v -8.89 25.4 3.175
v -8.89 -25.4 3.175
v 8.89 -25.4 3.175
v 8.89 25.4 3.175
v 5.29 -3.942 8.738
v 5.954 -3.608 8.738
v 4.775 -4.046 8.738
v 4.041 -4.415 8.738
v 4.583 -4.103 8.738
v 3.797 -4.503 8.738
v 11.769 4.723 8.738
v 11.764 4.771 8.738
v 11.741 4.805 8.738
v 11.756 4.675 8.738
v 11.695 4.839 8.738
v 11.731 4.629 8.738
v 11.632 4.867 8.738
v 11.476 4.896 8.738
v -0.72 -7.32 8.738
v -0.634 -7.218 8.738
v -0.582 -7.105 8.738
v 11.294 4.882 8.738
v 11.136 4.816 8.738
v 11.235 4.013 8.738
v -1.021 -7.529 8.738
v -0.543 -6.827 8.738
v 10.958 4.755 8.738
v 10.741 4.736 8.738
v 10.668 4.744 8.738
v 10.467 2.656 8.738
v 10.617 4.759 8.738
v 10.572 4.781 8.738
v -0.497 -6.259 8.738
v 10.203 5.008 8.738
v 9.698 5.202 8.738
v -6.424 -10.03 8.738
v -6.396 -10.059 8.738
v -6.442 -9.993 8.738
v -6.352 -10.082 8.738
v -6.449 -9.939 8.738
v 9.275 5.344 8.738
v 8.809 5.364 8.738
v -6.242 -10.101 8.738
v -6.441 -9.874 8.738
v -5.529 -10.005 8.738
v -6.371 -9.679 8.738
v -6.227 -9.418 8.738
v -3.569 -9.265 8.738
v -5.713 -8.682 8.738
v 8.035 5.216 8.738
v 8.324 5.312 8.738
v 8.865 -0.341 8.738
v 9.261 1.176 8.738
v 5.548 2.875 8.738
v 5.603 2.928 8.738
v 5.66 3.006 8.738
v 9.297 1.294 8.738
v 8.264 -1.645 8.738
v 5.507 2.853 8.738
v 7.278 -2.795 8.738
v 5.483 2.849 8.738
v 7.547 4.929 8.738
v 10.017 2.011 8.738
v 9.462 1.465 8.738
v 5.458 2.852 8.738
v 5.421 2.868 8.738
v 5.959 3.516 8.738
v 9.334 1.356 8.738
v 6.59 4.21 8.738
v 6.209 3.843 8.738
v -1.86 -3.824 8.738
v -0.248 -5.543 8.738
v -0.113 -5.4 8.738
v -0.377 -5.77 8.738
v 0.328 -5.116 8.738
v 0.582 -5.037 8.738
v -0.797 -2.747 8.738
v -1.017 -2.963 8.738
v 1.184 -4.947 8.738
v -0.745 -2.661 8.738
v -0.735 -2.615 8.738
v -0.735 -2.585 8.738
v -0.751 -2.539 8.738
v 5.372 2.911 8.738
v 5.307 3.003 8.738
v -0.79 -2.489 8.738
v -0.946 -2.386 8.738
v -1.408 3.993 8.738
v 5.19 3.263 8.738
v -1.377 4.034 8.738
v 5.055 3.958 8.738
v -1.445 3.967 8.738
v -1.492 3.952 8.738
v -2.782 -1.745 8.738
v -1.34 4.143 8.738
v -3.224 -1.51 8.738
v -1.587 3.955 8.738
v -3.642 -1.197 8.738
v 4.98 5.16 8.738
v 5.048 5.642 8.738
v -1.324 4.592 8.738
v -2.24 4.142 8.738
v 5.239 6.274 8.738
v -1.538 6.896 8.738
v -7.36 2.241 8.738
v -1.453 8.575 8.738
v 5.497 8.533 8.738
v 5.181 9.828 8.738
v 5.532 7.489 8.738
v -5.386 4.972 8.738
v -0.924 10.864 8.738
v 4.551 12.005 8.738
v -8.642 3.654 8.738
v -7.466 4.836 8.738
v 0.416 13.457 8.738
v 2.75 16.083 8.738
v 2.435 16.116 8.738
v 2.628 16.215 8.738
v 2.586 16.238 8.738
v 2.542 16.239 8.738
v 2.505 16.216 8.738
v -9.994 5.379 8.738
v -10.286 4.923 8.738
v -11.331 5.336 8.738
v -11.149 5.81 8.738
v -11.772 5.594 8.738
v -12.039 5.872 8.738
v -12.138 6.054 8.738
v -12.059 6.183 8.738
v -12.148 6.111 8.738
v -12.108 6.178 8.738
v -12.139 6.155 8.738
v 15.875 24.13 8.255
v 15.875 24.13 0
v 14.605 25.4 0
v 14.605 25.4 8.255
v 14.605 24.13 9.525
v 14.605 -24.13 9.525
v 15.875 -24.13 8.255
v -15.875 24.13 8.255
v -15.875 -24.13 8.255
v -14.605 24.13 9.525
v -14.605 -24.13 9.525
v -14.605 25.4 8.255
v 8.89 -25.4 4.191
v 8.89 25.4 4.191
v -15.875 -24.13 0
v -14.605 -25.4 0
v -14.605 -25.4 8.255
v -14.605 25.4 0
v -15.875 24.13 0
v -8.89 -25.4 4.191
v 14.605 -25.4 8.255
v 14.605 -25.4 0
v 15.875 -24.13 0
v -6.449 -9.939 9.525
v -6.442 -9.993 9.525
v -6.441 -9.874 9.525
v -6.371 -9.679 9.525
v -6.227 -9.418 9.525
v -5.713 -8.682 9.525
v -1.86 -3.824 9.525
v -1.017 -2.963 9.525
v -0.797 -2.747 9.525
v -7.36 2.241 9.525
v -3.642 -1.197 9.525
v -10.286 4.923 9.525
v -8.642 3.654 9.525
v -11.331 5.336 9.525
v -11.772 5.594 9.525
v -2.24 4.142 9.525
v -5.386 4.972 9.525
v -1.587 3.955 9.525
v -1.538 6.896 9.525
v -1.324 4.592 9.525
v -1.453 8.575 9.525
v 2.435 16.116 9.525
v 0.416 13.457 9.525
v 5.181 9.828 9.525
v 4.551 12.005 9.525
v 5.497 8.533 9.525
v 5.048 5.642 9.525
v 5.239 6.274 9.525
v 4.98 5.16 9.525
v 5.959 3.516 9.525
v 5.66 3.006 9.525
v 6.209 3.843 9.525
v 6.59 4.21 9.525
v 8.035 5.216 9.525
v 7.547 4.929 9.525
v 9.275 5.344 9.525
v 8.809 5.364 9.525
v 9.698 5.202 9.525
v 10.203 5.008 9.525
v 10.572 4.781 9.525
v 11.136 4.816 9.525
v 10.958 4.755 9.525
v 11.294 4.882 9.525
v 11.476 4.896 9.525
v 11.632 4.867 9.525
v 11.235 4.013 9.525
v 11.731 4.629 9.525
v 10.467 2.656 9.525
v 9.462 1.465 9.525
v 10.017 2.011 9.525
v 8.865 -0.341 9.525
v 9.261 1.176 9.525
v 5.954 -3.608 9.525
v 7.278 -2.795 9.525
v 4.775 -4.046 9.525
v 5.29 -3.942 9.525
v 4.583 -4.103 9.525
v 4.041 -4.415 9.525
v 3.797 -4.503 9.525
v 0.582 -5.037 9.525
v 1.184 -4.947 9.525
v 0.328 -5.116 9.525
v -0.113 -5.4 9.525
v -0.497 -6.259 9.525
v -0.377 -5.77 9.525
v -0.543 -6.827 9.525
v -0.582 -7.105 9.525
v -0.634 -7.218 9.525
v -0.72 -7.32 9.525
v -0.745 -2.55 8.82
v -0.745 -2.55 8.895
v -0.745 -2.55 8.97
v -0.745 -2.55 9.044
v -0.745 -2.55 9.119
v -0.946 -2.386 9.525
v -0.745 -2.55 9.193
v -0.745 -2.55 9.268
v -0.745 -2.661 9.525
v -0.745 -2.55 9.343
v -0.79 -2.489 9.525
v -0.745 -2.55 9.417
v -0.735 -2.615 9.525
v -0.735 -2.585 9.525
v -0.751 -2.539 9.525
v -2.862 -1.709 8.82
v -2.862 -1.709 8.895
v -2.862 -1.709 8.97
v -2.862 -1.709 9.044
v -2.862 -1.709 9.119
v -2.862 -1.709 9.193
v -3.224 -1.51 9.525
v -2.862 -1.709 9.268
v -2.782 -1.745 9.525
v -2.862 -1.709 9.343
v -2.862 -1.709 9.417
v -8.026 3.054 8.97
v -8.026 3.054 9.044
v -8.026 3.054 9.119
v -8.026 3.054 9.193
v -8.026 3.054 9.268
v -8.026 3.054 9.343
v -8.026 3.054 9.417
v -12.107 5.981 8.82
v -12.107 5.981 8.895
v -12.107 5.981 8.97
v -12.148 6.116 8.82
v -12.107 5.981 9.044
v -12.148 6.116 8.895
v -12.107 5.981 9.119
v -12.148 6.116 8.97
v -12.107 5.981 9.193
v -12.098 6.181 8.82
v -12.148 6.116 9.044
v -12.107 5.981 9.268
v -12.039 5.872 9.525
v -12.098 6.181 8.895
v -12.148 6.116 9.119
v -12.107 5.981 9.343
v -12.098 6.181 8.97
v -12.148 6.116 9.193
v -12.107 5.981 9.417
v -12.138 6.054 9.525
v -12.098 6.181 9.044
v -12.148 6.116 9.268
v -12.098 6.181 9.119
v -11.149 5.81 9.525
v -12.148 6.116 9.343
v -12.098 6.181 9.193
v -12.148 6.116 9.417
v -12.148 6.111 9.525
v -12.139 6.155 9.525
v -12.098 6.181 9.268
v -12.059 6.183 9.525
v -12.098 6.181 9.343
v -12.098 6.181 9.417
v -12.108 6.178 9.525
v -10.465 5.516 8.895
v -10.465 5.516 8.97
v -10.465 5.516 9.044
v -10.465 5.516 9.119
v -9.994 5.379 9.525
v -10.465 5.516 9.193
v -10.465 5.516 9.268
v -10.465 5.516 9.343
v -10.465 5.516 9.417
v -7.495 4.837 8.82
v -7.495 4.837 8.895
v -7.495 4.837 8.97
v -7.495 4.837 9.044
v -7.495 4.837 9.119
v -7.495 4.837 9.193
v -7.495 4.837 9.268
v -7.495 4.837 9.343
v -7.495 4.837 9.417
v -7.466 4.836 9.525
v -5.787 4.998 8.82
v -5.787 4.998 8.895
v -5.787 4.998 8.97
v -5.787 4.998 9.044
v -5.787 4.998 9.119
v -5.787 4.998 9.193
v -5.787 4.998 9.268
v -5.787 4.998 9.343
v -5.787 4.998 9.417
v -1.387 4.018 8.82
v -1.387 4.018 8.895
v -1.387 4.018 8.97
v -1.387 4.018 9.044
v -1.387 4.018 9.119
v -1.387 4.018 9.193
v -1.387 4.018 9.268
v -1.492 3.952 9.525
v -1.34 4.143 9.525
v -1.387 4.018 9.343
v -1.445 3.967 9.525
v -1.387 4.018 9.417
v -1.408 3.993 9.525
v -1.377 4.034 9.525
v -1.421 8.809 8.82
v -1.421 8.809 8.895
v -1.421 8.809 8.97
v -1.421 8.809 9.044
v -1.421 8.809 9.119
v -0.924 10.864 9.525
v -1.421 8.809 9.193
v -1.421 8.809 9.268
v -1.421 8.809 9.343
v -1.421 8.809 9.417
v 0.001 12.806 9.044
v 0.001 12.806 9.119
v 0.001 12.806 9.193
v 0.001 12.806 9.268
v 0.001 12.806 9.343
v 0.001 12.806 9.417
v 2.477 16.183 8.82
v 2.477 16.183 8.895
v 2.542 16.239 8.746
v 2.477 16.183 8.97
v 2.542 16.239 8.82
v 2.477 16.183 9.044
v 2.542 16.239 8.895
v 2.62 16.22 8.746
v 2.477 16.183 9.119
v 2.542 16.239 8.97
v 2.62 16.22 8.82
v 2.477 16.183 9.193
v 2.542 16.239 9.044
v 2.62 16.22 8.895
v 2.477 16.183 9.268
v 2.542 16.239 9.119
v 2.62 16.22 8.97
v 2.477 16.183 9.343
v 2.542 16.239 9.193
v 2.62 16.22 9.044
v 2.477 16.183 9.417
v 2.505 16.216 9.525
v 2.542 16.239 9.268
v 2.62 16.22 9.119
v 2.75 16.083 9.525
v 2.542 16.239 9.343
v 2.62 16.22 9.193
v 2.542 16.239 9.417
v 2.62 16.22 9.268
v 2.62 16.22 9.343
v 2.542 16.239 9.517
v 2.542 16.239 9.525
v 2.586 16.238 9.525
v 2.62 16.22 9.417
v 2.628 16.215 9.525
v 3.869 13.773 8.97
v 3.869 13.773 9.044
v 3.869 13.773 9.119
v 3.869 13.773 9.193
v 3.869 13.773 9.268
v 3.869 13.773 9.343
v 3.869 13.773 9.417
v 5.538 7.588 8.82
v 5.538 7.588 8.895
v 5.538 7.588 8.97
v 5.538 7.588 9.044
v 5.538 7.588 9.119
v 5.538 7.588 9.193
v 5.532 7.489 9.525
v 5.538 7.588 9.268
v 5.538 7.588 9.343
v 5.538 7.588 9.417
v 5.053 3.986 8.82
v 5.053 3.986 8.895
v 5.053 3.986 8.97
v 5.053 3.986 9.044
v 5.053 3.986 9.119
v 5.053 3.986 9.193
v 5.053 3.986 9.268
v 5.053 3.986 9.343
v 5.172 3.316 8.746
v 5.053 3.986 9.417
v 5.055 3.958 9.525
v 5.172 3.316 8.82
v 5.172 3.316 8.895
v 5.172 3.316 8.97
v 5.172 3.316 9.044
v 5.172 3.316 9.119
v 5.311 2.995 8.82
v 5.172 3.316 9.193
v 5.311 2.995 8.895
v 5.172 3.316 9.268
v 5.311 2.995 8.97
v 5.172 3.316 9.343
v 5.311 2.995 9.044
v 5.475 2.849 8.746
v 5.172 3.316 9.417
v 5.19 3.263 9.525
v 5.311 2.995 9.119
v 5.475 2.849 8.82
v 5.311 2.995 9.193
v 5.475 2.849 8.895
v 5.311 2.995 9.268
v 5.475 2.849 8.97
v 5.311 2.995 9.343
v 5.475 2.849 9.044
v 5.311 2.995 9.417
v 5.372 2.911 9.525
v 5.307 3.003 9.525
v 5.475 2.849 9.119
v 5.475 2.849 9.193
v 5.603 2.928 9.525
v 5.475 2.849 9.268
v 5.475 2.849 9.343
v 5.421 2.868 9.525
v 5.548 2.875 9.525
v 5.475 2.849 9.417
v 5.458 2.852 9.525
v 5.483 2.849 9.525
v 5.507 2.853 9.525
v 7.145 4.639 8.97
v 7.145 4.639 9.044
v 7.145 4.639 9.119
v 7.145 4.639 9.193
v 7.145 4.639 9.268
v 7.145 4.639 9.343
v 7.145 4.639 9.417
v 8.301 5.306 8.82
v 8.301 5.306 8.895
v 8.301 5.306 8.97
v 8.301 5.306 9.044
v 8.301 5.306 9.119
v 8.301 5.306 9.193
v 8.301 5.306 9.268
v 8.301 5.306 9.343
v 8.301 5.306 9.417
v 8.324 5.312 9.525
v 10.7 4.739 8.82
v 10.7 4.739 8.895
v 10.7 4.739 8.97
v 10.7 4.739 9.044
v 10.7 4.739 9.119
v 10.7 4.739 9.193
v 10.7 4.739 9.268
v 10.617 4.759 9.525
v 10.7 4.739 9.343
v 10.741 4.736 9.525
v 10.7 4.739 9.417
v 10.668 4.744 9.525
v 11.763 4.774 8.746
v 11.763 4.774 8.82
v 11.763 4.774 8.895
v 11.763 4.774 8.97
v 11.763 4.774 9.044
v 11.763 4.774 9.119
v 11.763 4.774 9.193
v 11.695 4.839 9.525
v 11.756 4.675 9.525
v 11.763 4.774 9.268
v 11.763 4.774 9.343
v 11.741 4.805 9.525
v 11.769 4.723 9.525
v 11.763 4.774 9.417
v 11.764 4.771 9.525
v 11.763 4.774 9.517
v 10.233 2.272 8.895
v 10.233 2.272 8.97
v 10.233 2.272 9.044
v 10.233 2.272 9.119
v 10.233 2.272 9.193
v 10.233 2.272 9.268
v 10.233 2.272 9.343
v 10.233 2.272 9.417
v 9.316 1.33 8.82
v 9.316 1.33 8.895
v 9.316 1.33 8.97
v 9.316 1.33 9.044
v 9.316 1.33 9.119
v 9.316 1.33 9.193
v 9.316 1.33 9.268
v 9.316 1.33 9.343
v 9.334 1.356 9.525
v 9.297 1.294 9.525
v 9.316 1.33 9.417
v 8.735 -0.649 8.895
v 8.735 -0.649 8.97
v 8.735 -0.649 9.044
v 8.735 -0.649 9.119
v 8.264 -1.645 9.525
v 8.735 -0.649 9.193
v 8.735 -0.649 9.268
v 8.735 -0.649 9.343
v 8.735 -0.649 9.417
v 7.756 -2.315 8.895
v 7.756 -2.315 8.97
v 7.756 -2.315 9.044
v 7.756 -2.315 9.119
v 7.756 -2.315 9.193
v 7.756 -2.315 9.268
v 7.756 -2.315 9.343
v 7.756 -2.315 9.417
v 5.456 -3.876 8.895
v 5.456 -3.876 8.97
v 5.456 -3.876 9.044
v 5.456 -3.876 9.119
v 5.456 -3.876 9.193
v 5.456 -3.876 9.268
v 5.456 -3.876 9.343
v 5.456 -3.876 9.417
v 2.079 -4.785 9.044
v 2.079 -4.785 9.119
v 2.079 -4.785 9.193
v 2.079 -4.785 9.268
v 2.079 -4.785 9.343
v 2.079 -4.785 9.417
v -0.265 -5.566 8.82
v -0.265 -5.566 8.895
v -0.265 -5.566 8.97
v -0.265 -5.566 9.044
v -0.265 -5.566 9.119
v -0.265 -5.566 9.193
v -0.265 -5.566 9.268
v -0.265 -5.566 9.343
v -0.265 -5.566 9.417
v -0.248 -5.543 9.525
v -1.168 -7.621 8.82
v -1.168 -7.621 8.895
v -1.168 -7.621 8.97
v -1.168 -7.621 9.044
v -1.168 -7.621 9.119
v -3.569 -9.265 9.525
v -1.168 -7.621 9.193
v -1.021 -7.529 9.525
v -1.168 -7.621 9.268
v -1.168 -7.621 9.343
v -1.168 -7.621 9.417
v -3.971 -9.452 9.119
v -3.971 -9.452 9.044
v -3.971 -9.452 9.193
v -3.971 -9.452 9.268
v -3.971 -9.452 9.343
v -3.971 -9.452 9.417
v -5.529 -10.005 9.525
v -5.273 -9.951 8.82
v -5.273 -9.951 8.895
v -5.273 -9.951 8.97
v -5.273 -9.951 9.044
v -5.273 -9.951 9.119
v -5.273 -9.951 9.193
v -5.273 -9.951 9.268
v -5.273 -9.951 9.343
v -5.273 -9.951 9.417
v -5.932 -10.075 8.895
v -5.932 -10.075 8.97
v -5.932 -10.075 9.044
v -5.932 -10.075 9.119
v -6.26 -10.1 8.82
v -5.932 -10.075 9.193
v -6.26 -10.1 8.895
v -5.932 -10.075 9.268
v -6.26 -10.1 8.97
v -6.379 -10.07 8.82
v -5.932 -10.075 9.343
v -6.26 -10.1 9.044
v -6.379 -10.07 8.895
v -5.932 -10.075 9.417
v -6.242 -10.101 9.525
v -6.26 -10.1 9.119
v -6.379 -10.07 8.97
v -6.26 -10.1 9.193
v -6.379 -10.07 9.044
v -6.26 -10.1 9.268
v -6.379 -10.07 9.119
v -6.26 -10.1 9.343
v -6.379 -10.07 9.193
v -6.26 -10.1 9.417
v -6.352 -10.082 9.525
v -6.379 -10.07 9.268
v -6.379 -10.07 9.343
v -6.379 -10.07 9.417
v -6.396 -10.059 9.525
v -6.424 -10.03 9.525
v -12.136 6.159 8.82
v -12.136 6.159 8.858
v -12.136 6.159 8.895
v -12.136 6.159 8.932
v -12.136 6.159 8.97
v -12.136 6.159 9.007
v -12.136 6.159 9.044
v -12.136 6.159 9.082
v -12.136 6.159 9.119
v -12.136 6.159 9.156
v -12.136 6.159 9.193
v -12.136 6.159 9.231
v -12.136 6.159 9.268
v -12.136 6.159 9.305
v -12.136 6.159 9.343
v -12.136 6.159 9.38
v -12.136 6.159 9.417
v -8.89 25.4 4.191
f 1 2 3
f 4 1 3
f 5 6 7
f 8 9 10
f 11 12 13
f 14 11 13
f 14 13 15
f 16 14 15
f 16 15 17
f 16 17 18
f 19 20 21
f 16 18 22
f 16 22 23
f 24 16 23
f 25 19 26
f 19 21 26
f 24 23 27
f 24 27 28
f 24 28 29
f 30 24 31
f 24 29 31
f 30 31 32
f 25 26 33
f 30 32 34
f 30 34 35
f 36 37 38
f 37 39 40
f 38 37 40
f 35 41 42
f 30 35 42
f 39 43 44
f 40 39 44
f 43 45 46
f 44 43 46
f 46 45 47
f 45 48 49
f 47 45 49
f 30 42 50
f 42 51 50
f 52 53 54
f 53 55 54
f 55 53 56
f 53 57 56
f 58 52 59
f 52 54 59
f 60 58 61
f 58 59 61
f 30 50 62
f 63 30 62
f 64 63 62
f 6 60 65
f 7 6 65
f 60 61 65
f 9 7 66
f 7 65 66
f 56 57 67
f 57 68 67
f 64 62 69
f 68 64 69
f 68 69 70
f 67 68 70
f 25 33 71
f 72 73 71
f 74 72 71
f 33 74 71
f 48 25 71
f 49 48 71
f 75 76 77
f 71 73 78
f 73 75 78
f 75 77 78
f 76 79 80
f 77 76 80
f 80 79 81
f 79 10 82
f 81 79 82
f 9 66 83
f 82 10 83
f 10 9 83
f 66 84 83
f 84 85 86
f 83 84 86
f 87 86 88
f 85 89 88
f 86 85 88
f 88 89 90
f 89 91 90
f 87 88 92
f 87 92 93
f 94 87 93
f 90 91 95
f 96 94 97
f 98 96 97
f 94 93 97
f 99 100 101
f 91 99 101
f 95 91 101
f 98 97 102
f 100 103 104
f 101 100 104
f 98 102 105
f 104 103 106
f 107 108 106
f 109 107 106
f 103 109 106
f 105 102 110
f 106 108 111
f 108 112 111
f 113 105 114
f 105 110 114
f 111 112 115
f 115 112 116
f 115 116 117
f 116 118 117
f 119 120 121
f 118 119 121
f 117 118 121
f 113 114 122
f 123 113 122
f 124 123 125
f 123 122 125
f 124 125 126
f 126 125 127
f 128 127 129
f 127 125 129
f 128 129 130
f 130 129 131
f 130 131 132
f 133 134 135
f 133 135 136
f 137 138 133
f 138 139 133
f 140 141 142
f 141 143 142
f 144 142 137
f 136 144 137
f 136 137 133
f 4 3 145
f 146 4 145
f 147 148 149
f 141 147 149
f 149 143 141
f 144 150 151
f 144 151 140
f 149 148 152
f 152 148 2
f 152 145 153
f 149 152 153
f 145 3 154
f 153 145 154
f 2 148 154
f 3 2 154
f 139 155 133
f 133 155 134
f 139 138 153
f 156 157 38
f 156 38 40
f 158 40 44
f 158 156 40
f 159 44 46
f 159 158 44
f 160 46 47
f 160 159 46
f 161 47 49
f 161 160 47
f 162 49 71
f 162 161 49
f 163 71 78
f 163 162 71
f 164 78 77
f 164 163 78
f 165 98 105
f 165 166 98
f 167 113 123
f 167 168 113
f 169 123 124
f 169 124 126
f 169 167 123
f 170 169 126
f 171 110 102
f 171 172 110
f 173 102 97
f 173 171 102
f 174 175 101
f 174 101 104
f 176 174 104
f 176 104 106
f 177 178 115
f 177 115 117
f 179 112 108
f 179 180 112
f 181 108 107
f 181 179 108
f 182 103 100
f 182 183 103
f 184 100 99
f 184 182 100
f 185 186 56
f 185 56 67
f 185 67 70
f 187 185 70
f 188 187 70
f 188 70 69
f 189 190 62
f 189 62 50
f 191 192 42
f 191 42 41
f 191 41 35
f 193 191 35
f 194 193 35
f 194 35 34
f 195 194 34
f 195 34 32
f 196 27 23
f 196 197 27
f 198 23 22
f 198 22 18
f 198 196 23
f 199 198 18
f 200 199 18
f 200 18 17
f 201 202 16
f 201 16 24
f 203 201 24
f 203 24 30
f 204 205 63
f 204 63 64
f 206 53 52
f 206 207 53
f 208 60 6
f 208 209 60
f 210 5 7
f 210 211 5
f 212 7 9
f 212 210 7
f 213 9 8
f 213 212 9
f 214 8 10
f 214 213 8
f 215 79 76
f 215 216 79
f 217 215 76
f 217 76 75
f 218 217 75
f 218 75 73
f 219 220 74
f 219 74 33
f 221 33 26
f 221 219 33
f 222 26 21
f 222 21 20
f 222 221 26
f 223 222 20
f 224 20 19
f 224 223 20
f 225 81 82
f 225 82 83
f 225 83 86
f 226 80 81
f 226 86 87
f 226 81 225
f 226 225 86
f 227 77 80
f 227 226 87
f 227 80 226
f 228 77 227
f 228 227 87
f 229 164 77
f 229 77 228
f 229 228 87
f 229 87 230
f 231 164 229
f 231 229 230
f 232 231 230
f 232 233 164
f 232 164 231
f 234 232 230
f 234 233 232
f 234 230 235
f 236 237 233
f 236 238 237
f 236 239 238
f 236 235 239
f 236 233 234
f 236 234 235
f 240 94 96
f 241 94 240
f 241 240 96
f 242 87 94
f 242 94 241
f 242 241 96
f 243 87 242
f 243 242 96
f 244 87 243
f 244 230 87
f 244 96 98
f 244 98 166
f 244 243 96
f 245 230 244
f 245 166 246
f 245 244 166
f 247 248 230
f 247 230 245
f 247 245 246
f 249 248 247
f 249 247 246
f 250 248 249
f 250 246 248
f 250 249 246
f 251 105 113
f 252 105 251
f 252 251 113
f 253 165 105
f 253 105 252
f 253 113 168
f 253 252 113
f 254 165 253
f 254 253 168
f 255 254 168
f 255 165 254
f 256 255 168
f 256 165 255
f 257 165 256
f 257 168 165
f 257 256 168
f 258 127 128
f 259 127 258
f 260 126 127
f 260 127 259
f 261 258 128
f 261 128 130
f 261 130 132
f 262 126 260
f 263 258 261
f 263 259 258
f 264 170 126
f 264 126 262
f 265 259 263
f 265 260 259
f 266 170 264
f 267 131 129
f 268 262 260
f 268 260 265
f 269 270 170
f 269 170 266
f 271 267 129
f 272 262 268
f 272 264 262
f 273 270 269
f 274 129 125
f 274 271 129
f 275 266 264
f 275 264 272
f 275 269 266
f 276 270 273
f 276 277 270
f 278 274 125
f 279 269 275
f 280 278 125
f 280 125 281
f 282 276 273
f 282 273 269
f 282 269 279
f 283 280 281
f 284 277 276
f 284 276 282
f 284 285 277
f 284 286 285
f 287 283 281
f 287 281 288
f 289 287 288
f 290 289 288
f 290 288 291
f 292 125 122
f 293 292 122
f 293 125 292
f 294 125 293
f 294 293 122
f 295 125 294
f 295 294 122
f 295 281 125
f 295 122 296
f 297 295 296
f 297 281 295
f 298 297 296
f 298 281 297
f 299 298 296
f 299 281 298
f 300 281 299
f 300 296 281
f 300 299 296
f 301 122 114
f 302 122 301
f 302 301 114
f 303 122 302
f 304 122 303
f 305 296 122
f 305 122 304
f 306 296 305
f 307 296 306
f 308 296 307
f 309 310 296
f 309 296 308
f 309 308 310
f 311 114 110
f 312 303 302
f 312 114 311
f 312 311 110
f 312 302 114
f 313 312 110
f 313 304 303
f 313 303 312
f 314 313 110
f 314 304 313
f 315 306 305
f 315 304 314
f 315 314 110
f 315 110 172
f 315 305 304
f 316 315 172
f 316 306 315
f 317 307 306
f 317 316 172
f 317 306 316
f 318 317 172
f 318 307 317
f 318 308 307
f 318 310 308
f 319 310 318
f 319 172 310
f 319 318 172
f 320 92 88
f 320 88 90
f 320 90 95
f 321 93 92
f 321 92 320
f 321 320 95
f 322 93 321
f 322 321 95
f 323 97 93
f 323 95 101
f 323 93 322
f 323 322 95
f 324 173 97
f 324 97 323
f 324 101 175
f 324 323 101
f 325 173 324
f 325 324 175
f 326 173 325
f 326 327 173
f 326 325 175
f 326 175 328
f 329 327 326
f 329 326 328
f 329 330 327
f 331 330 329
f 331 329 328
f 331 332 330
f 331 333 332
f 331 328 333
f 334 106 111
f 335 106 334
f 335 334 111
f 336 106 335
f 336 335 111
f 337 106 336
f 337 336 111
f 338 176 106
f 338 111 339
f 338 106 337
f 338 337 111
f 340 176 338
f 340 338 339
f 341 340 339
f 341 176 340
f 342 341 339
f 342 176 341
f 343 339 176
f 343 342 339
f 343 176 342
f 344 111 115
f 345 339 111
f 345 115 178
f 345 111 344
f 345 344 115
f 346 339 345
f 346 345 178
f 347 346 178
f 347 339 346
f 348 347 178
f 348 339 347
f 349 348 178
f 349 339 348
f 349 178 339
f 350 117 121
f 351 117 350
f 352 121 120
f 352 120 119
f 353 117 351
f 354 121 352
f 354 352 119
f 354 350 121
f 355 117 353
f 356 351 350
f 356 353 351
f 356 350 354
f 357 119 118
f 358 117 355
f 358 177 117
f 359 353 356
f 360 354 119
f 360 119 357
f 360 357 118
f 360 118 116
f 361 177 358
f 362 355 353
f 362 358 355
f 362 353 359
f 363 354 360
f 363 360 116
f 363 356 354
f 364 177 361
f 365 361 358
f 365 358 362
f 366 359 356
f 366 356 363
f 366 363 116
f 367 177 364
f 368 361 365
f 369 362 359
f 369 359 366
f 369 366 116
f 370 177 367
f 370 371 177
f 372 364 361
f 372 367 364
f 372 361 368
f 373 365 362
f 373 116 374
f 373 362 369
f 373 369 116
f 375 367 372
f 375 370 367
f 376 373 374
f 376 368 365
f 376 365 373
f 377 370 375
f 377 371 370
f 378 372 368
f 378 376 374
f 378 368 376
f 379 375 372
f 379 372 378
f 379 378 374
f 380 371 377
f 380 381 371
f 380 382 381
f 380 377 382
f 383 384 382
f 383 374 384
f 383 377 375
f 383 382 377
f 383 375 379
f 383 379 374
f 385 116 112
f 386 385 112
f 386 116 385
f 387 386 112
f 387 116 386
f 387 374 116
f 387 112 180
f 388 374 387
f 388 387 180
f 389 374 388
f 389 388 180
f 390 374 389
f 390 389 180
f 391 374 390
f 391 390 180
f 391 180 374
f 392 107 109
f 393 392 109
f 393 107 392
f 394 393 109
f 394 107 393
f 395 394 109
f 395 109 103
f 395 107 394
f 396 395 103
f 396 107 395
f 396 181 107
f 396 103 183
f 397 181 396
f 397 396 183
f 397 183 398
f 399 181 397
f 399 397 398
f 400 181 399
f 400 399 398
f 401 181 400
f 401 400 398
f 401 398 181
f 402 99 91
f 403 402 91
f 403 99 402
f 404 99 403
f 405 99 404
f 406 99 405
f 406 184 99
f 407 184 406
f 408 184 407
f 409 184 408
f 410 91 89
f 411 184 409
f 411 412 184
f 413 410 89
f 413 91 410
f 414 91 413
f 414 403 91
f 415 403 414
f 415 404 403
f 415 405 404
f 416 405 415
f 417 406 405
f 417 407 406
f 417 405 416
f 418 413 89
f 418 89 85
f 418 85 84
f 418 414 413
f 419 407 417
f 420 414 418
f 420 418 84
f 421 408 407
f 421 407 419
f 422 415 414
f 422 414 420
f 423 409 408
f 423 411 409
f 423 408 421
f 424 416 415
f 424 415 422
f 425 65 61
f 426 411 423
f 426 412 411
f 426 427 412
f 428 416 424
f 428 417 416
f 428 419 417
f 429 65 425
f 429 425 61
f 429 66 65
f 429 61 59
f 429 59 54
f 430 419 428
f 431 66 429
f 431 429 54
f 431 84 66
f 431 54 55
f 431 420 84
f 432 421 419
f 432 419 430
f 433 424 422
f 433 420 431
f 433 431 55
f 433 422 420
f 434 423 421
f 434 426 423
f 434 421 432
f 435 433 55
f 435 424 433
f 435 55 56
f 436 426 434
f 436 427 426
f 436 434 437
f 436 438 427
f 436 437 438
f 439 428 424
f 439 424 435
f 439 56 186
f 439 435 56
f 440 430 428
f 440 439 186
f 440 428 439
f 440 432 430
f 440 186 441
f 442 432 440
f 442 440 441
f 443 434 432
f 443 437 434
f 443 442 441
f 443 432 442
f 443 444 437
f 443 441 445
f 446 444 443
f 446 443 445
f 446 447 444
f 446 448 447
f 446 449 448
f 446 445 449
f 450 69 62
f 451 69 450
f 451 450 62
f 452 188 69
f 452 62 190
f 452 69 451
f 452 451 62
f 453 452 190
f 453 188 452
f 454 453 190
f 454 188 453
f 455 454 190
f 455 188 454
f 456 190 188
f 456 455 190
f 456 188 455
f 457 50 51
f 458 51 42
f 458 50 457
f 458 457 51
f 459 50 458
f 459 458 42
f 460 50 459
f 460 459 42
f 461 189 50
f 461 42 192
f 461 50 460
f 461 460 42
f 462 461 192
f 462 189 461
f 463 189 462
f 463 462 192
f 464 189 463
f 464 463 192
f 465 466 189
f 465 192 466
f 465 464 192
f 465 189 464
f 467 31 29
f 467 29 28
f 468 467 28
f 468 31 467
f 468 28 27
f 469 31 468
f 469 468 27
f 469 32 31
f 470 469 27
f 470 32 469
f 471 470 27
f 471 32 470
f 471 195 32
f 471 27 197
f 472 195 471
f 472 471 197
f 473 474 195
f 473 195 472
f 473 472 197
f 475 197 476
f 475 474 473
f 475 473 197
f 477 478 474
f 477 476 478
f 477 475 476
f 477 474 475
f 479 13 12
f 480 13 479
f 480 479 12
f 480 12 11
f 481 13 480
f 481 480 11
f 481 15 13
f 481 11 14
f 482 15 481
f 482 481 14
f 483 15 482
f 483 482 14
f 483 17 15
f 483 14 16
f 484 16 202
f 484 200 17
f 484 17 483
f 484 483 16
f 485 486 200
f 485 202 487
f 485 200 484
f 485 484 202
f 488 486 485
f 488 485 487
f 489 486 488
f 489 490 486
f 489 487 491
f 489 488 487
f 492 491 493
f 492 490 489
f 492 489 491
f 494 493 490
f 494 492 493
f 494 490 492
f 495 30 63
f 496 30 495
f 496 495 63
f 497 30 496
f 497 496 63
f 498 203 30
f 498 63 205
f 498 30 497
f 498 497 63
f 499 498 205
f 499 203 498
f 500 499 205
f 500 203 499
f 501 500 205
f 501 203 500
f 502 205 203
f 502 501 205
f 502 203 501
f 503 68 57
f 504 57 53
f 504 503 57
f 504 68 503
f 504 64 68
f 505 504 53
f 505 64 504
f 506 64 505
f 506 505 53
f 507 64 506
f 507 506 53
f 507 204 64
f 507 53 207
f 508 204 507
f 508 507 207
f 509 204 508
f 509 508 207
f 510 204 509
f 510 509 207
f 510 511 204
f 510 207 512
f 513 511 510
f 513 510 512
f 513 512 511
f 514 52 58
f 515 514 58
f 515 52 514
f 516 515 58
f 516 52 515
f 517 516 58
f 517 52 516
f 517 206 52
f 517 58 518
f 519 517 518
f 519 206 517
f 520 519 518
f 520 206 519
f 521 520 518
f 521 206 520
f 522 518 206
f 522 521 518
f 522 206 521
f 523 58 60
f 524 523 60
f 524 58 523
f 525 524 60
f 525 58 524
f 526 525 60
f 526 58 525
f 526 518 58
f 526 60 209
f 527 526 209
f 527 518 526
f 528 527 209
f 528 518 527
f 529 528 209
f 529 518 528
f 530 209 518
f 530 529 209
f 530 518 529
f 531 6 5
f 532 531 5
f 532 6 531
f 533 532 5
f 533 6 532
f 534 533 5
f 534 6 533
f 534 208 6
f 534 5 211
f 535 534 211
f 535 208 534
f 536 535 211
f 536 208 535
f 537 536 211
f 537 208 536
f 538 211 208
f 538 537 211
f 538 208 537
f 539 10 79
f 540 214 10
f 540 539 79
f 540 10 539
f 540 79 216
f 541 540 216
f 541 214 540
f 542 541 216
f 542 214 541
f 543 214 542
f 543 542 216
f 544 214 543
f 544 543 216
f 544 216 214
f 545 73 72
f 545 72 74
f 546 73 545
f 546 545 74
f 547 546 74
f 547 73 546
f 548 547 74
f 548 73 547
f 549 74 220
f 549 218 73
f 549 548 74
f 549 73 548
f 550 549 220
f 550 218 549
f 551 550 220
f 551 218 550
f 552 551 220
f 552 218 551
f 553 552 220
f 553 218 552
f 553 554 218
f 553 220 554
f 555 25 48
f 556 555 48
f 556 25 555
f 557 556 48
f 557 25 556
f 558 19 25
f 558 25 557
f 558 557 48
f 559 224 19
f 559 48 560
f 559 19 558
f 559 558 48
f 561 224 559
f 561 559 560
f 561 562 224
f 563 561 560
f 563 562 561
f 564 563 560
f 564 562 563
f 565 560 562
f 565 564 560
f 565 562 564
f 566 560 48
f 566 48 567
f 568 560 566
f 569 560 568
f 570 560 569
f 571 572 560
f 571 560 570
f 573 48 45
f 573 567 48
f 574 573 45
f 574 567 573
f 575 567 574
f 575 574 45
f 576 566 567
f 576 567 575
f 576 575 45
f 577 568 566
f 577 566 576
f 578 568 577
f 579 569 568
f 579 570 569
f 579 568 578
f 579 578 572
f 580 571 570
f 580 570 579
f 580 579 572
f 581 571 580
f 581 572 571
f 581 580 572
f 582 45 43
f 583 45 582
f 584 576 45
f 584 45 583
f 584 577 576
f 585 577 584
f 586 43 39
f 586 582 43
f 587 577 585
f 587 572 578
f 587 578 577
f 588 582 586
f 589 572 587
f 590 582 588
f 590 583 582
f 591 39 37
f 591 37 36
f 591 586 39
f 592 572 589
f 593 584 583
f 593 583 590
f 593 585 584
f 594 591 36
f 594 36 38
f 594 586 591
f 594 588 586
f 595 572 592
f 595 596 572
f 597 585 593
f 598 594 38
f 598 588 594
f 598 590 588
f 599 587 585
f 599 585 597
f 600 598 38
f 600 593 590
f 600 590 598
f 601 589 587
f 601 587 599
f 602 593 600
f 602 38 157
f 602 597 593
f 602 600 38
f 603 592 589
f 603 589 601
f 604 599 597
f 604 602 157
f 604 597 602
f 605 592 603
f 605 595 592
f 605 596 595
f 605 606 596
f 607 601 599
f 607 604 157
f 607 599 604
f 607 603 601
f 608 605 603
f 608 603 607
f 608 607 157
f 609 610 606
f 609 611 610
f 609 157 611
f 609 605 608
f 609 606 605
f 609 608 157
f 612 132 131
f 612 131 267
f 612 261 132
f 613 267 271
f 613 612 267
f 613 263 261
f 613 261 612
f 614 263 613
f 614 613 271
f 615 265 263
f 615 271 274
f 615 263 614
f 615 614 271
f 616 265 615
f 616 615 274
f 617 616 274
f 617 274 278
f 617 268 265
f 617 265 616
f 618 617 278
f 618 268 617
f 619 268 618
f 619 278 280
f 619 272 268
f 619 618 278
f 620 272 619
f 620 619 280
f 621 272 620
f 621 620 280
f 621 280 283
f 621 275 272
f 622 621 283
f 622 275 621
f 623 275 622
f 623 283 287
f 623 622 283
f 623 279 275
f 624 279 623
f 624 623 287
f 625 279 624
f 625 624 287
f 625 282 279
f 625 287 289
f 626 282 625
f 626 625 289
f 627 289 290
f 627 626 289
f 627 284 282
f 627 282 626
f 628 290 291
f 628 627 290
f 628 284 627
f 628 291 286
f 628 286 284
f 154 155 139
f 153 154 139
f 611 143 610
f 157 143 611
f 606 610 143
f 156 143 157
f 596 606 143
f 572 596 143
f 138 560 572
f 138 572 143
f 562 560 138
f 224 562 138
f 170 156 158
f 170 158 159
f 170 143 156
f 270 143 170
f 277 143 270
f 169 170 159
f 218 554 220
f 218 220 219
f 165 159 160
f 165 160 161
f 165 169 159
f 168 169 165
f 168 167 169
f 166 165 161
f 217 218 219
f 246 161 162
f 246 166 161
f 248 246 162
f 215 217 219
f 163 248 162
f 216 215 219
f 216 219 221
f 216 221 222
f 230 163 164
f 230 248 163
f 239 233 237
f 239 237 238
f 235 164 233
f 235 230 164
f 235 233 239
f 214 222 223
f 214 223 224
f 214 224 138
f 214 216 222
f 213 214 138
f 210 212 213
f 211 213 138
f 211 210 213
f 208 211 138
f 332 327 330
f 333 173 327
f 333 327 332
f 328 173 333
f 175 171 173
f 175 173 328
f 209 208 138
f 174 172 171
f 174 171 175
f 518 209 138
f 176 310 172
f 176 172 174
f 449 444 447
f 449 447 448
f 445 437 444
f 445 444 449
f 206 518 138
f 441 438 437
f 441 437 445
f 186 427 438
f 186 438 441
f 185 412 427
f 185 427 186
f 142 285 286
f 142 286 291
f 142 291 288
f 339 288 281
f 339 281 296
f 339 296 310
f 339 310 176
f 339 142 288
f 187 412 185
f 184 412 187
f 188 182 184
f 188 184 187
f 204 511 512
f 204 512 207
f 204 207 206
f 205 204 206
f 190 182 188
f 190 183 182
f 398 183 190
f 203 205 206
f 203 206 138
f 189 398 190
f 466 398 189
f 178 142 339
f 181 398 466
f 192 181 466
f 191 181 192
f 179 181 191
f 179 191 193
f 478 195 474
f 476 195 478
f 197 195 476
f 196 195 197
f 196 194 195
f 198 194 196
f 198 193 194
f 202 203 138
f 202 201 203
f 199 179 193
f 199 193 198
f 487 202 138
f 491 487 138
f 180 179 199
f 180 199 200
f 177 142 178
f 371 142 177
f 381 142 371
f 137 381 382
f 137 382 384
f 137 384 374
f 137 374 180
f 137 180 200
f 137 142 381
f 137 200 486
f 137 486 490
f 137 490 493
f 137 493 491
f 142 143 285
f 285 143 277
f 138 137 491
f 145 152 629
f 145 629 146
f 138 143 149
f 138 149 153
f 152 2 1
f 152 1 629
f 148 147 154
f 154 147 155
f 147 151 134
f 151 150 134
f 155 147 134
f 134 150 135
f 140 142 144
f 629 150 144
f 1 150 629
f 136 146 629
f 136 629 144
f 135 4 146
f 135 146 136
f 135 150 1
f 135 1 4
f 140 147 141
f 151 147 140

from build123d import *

# Parameters (mm, degrees)
F0_W     = 31.75
F0_H     = 50.8
F1_DEPTH = 9.525
F2_W     = 17.78
F2_H     = 1.016
F3_DEPTH = 58.42
F4_SIZE  = 1.27
F7_DEPTH = 0.7874


with BuildPart() as f1:
    # F0 (on Top) → F1 (new body)
    with BuildSketch(Plane.XY):
        Rectangle(F0_W, F0_H)
    extrude(amount=F1_DEPTH)

    # F2 (on face) → F3 (cut)
    with BuildSketch(Plane.XZ.offset(25.4)):
        with Locations((0, 3.683)):
            Rectangle(F2_W, F2_H)
    extrude(amount=-F3_DEPTH, mode=Mode.SUBTRACT)

    # F4
    f4_edges = [f1.edges().sort_by_distance(p)[0] for p in [
        (-15.875, 0, 9.525),
        (15.875, 0, 9.525),
        (0, -25.4, 9.525),
        (0, 25.4, 9.525),
        (-15.875, -25.4, 4.7625),
        (-15.875, 25.4, 4.7625),
        (15.875, 25.4, 4.7625),
        (15.875, -25.4, 4.7625),
    ]]
    chamfer(f4_edges, length=F4_SIZE)

    # F6 (on face) → F7 (cut)
    with BuildSketch(Plane.XY.offset(9.525)):
        with BuildLine():
            add(Edge.make_bspline(
                [(-6.4422910614, -9.992572479), (-6.576387638, -9.5277504866), (-2.9682513045, -5.5271485494), (-1.6230370241, -3.3267226029), (-0.1391517651, -2.3837543589), (-3.2745475931, -1.8910386002), (-4.4465516447, -0.1797364285), (-6.7888228815, 1.3070519976), (-7.888095117, 3.0827671512), (-9.4719419101, 4.3360710627), (-10.3052427191, 5.0482783915), (-11.7938524336, 5.3782417952), (-12.4842332356, 6.5829203), (-10.32925606, 5.2604715213), (-8.8451225007, 5.3133712001), (-7.5041527627, 4.6355935651), (-5.7727147566, 5.1814768448), (-4.0784426049, 4.6283461923), (-1.9873135315, 4.0916530706), (-1.108705884, 3.7615835829), (-1.6486852677, 6.5590375218), (-1.4710237672, 8.7687761974), (-1.0661623991, 10.7075732038), (-0.0610322166, 12.855636179), (1.2394716743, 14.6101225048), (2.3332163777, 15.7965761736), (2.5641123266, 16.4961779341), (3.252212115, 15.2178296727), (3.8540014355, 13.7730672833), (4.5585807656, 12.2961361883), (4.8257092414, 10.5291786991), (5.4097550677, 9.4613192433), (5.6340869151, 7.5627733225), (5.3266594346, 6.4884408338), (4.8950565869, 5.3286938068), (5.0601967769, 4.3396482601), (5.041123295, 3.5576924459), (5.4972037108, 2.4843281805), (5.9602740046, 3.7655404276), (7.1142399283, 4.6168015862), (8.0528024254, 5.3075552814), (8.7220878624, 5.3658636167), (9.3004070886, 5.380882436), (9.765063634, 5.1626351357), (10.2212334129, 5.0276867702), (10.521522363, 4.8066763864), (10.6884480245, 4.7128941565), (11.0688814513, 4.7603953024), (11.2323128826, 4.8813015119), (11.4523118748, 4.9065218961), (11.6408865133, 4.8752991874), (11.7926899892, 4.7857749875), (11.750485731, 4.6303349314), (11.6017892672, 4.4808231583), (11.4819118772, 4.3517434996), (11.3218017, 4.1565276582), (11.0066595601, 3.657677632), (10.8380601263, 3.3525955918), (10.6583433698, 2.933851586), (10.4502325895, 2.6481420558), (10.2539582326, 2.2588087396), (9.8756355327, 1.8550879004), (9.6252045102, 1.6491392204), (9.4701910215, 1.4534911373), (9.2726879661, 1.3463737098), (9.2265213781, 0.9109138219), (9.0874966435, 0.3398509189), (8.9620205457, -0.1310281139), (8.7310528775, -0.6459707167), (8.5089153347, -1.2188165983), (8.2716856279, -1.660544323), (7.7650531821, -2.3433500022), (7.058572815, -3.0316958873), (6.2786373328, -3.3954442295), (5.4932410272, -3.9034684174), (4.9521468897, -4.0406062951), (4.5835422446, -4.0413084885), (3.9631062689, -4.5319073147), (3.4102105666, -4.5287631488), (2.7699499357, -4.6692566402), (2.0767651322, -4.7850268217), (1.4604520985, -4.8904421235), (0.8279800508, -5.0195910317), (0.4250010726, -5.0308740722), (-0.1703625544, -5.390322009), (-0.4112720451, -5.780687892), (-0.5018080947, -6.2536290481), (-0.5456870856, -6.6366625746), (-0.5362555398, -6.9175416952), (-0.6106373398, -7.3195509206), (-1.2240352375, -7.6132252976), (-1.8316007812, -8.1769049773), (-2.9486193154, -8.9853873298), (-3.9487797942, -9.4402211085), (-4.9500394796, -9.9030628486), (-5.7487292428, -10.0484224765), (-6.397083294, -10.1492771843), (-6.4422910614, -9.992572479)],
                knots=[0, 0, 0, 0, 0.0259583215, 0.0463470715, 0.0567251674, 0.0738079829, 0.0907844627, 0.1091718607, 0.1256889827, 0.1413976537, 0.1533148285, 0.1673981773, 0.17647171, 0.1915663411, 0.2062111205, 0.2194305564, 0.2340371558, 0.2494254623, 0.2662405005, 0.2741870684, 0.2914307839, 0.3091818467, 0.3248382765, 0.3421461096, 0.3591987917, 0.37359296, 0.3806487222, 0.3923027758, 0.4071889257, 0.4216976763, 0.4365182631, 0.4491655771, 0.4644212141, 0.4765478409, 0.4888771884, 0.4999804433, 0.5105377457, 0.5201314395, 0.5307861511, 0.5449434096, 0.5569882646, 0.5660330692, 0.5744812832, 0.5825287377, 0.5903862073, 0.5971191632, 0.602028747, 0.6087917991, 0.6139450483, 0.6191009197, 0.6241252147, 0.6284637057, 0.6325603162, 0.6377614234, 0.6424385646, 0.6481191834, 0.6567479492, 0.6636575486, 0.671125053, 0.6778457736, 0.6853132107, 0.6937265181, 0.7002034218, 0.7057032178, 0.7107202105, 0.7179400004, 0.7267299464, 0.7346319678, 0.7431207361, 0.7519146763, 0.7598931863, 0.7702511207, 0.7814694511, 0.7920526642, 0.8029761348, 0.8112001577, 0.8179276915, 0.8276426626, 0.836041303, 0.8451293318, 0.8546194381, 0.8636840382, 0.872611968, 0.8798430239, 0.8889941392, 0.8966487669, 0.9044270279, 0.9114121696, 0.9173799068, 0.9241469938, 0.9330649947, 0.9435250122, 0.9567341565, 0.9687796228, 0.9804435568, 0.991248712, 1, 1, 1, 1], degree=3))
        make_face()
    extrude(amount=-F7_DEPTH, mode=Mode.SUBTRACT)


solid = f1.part
